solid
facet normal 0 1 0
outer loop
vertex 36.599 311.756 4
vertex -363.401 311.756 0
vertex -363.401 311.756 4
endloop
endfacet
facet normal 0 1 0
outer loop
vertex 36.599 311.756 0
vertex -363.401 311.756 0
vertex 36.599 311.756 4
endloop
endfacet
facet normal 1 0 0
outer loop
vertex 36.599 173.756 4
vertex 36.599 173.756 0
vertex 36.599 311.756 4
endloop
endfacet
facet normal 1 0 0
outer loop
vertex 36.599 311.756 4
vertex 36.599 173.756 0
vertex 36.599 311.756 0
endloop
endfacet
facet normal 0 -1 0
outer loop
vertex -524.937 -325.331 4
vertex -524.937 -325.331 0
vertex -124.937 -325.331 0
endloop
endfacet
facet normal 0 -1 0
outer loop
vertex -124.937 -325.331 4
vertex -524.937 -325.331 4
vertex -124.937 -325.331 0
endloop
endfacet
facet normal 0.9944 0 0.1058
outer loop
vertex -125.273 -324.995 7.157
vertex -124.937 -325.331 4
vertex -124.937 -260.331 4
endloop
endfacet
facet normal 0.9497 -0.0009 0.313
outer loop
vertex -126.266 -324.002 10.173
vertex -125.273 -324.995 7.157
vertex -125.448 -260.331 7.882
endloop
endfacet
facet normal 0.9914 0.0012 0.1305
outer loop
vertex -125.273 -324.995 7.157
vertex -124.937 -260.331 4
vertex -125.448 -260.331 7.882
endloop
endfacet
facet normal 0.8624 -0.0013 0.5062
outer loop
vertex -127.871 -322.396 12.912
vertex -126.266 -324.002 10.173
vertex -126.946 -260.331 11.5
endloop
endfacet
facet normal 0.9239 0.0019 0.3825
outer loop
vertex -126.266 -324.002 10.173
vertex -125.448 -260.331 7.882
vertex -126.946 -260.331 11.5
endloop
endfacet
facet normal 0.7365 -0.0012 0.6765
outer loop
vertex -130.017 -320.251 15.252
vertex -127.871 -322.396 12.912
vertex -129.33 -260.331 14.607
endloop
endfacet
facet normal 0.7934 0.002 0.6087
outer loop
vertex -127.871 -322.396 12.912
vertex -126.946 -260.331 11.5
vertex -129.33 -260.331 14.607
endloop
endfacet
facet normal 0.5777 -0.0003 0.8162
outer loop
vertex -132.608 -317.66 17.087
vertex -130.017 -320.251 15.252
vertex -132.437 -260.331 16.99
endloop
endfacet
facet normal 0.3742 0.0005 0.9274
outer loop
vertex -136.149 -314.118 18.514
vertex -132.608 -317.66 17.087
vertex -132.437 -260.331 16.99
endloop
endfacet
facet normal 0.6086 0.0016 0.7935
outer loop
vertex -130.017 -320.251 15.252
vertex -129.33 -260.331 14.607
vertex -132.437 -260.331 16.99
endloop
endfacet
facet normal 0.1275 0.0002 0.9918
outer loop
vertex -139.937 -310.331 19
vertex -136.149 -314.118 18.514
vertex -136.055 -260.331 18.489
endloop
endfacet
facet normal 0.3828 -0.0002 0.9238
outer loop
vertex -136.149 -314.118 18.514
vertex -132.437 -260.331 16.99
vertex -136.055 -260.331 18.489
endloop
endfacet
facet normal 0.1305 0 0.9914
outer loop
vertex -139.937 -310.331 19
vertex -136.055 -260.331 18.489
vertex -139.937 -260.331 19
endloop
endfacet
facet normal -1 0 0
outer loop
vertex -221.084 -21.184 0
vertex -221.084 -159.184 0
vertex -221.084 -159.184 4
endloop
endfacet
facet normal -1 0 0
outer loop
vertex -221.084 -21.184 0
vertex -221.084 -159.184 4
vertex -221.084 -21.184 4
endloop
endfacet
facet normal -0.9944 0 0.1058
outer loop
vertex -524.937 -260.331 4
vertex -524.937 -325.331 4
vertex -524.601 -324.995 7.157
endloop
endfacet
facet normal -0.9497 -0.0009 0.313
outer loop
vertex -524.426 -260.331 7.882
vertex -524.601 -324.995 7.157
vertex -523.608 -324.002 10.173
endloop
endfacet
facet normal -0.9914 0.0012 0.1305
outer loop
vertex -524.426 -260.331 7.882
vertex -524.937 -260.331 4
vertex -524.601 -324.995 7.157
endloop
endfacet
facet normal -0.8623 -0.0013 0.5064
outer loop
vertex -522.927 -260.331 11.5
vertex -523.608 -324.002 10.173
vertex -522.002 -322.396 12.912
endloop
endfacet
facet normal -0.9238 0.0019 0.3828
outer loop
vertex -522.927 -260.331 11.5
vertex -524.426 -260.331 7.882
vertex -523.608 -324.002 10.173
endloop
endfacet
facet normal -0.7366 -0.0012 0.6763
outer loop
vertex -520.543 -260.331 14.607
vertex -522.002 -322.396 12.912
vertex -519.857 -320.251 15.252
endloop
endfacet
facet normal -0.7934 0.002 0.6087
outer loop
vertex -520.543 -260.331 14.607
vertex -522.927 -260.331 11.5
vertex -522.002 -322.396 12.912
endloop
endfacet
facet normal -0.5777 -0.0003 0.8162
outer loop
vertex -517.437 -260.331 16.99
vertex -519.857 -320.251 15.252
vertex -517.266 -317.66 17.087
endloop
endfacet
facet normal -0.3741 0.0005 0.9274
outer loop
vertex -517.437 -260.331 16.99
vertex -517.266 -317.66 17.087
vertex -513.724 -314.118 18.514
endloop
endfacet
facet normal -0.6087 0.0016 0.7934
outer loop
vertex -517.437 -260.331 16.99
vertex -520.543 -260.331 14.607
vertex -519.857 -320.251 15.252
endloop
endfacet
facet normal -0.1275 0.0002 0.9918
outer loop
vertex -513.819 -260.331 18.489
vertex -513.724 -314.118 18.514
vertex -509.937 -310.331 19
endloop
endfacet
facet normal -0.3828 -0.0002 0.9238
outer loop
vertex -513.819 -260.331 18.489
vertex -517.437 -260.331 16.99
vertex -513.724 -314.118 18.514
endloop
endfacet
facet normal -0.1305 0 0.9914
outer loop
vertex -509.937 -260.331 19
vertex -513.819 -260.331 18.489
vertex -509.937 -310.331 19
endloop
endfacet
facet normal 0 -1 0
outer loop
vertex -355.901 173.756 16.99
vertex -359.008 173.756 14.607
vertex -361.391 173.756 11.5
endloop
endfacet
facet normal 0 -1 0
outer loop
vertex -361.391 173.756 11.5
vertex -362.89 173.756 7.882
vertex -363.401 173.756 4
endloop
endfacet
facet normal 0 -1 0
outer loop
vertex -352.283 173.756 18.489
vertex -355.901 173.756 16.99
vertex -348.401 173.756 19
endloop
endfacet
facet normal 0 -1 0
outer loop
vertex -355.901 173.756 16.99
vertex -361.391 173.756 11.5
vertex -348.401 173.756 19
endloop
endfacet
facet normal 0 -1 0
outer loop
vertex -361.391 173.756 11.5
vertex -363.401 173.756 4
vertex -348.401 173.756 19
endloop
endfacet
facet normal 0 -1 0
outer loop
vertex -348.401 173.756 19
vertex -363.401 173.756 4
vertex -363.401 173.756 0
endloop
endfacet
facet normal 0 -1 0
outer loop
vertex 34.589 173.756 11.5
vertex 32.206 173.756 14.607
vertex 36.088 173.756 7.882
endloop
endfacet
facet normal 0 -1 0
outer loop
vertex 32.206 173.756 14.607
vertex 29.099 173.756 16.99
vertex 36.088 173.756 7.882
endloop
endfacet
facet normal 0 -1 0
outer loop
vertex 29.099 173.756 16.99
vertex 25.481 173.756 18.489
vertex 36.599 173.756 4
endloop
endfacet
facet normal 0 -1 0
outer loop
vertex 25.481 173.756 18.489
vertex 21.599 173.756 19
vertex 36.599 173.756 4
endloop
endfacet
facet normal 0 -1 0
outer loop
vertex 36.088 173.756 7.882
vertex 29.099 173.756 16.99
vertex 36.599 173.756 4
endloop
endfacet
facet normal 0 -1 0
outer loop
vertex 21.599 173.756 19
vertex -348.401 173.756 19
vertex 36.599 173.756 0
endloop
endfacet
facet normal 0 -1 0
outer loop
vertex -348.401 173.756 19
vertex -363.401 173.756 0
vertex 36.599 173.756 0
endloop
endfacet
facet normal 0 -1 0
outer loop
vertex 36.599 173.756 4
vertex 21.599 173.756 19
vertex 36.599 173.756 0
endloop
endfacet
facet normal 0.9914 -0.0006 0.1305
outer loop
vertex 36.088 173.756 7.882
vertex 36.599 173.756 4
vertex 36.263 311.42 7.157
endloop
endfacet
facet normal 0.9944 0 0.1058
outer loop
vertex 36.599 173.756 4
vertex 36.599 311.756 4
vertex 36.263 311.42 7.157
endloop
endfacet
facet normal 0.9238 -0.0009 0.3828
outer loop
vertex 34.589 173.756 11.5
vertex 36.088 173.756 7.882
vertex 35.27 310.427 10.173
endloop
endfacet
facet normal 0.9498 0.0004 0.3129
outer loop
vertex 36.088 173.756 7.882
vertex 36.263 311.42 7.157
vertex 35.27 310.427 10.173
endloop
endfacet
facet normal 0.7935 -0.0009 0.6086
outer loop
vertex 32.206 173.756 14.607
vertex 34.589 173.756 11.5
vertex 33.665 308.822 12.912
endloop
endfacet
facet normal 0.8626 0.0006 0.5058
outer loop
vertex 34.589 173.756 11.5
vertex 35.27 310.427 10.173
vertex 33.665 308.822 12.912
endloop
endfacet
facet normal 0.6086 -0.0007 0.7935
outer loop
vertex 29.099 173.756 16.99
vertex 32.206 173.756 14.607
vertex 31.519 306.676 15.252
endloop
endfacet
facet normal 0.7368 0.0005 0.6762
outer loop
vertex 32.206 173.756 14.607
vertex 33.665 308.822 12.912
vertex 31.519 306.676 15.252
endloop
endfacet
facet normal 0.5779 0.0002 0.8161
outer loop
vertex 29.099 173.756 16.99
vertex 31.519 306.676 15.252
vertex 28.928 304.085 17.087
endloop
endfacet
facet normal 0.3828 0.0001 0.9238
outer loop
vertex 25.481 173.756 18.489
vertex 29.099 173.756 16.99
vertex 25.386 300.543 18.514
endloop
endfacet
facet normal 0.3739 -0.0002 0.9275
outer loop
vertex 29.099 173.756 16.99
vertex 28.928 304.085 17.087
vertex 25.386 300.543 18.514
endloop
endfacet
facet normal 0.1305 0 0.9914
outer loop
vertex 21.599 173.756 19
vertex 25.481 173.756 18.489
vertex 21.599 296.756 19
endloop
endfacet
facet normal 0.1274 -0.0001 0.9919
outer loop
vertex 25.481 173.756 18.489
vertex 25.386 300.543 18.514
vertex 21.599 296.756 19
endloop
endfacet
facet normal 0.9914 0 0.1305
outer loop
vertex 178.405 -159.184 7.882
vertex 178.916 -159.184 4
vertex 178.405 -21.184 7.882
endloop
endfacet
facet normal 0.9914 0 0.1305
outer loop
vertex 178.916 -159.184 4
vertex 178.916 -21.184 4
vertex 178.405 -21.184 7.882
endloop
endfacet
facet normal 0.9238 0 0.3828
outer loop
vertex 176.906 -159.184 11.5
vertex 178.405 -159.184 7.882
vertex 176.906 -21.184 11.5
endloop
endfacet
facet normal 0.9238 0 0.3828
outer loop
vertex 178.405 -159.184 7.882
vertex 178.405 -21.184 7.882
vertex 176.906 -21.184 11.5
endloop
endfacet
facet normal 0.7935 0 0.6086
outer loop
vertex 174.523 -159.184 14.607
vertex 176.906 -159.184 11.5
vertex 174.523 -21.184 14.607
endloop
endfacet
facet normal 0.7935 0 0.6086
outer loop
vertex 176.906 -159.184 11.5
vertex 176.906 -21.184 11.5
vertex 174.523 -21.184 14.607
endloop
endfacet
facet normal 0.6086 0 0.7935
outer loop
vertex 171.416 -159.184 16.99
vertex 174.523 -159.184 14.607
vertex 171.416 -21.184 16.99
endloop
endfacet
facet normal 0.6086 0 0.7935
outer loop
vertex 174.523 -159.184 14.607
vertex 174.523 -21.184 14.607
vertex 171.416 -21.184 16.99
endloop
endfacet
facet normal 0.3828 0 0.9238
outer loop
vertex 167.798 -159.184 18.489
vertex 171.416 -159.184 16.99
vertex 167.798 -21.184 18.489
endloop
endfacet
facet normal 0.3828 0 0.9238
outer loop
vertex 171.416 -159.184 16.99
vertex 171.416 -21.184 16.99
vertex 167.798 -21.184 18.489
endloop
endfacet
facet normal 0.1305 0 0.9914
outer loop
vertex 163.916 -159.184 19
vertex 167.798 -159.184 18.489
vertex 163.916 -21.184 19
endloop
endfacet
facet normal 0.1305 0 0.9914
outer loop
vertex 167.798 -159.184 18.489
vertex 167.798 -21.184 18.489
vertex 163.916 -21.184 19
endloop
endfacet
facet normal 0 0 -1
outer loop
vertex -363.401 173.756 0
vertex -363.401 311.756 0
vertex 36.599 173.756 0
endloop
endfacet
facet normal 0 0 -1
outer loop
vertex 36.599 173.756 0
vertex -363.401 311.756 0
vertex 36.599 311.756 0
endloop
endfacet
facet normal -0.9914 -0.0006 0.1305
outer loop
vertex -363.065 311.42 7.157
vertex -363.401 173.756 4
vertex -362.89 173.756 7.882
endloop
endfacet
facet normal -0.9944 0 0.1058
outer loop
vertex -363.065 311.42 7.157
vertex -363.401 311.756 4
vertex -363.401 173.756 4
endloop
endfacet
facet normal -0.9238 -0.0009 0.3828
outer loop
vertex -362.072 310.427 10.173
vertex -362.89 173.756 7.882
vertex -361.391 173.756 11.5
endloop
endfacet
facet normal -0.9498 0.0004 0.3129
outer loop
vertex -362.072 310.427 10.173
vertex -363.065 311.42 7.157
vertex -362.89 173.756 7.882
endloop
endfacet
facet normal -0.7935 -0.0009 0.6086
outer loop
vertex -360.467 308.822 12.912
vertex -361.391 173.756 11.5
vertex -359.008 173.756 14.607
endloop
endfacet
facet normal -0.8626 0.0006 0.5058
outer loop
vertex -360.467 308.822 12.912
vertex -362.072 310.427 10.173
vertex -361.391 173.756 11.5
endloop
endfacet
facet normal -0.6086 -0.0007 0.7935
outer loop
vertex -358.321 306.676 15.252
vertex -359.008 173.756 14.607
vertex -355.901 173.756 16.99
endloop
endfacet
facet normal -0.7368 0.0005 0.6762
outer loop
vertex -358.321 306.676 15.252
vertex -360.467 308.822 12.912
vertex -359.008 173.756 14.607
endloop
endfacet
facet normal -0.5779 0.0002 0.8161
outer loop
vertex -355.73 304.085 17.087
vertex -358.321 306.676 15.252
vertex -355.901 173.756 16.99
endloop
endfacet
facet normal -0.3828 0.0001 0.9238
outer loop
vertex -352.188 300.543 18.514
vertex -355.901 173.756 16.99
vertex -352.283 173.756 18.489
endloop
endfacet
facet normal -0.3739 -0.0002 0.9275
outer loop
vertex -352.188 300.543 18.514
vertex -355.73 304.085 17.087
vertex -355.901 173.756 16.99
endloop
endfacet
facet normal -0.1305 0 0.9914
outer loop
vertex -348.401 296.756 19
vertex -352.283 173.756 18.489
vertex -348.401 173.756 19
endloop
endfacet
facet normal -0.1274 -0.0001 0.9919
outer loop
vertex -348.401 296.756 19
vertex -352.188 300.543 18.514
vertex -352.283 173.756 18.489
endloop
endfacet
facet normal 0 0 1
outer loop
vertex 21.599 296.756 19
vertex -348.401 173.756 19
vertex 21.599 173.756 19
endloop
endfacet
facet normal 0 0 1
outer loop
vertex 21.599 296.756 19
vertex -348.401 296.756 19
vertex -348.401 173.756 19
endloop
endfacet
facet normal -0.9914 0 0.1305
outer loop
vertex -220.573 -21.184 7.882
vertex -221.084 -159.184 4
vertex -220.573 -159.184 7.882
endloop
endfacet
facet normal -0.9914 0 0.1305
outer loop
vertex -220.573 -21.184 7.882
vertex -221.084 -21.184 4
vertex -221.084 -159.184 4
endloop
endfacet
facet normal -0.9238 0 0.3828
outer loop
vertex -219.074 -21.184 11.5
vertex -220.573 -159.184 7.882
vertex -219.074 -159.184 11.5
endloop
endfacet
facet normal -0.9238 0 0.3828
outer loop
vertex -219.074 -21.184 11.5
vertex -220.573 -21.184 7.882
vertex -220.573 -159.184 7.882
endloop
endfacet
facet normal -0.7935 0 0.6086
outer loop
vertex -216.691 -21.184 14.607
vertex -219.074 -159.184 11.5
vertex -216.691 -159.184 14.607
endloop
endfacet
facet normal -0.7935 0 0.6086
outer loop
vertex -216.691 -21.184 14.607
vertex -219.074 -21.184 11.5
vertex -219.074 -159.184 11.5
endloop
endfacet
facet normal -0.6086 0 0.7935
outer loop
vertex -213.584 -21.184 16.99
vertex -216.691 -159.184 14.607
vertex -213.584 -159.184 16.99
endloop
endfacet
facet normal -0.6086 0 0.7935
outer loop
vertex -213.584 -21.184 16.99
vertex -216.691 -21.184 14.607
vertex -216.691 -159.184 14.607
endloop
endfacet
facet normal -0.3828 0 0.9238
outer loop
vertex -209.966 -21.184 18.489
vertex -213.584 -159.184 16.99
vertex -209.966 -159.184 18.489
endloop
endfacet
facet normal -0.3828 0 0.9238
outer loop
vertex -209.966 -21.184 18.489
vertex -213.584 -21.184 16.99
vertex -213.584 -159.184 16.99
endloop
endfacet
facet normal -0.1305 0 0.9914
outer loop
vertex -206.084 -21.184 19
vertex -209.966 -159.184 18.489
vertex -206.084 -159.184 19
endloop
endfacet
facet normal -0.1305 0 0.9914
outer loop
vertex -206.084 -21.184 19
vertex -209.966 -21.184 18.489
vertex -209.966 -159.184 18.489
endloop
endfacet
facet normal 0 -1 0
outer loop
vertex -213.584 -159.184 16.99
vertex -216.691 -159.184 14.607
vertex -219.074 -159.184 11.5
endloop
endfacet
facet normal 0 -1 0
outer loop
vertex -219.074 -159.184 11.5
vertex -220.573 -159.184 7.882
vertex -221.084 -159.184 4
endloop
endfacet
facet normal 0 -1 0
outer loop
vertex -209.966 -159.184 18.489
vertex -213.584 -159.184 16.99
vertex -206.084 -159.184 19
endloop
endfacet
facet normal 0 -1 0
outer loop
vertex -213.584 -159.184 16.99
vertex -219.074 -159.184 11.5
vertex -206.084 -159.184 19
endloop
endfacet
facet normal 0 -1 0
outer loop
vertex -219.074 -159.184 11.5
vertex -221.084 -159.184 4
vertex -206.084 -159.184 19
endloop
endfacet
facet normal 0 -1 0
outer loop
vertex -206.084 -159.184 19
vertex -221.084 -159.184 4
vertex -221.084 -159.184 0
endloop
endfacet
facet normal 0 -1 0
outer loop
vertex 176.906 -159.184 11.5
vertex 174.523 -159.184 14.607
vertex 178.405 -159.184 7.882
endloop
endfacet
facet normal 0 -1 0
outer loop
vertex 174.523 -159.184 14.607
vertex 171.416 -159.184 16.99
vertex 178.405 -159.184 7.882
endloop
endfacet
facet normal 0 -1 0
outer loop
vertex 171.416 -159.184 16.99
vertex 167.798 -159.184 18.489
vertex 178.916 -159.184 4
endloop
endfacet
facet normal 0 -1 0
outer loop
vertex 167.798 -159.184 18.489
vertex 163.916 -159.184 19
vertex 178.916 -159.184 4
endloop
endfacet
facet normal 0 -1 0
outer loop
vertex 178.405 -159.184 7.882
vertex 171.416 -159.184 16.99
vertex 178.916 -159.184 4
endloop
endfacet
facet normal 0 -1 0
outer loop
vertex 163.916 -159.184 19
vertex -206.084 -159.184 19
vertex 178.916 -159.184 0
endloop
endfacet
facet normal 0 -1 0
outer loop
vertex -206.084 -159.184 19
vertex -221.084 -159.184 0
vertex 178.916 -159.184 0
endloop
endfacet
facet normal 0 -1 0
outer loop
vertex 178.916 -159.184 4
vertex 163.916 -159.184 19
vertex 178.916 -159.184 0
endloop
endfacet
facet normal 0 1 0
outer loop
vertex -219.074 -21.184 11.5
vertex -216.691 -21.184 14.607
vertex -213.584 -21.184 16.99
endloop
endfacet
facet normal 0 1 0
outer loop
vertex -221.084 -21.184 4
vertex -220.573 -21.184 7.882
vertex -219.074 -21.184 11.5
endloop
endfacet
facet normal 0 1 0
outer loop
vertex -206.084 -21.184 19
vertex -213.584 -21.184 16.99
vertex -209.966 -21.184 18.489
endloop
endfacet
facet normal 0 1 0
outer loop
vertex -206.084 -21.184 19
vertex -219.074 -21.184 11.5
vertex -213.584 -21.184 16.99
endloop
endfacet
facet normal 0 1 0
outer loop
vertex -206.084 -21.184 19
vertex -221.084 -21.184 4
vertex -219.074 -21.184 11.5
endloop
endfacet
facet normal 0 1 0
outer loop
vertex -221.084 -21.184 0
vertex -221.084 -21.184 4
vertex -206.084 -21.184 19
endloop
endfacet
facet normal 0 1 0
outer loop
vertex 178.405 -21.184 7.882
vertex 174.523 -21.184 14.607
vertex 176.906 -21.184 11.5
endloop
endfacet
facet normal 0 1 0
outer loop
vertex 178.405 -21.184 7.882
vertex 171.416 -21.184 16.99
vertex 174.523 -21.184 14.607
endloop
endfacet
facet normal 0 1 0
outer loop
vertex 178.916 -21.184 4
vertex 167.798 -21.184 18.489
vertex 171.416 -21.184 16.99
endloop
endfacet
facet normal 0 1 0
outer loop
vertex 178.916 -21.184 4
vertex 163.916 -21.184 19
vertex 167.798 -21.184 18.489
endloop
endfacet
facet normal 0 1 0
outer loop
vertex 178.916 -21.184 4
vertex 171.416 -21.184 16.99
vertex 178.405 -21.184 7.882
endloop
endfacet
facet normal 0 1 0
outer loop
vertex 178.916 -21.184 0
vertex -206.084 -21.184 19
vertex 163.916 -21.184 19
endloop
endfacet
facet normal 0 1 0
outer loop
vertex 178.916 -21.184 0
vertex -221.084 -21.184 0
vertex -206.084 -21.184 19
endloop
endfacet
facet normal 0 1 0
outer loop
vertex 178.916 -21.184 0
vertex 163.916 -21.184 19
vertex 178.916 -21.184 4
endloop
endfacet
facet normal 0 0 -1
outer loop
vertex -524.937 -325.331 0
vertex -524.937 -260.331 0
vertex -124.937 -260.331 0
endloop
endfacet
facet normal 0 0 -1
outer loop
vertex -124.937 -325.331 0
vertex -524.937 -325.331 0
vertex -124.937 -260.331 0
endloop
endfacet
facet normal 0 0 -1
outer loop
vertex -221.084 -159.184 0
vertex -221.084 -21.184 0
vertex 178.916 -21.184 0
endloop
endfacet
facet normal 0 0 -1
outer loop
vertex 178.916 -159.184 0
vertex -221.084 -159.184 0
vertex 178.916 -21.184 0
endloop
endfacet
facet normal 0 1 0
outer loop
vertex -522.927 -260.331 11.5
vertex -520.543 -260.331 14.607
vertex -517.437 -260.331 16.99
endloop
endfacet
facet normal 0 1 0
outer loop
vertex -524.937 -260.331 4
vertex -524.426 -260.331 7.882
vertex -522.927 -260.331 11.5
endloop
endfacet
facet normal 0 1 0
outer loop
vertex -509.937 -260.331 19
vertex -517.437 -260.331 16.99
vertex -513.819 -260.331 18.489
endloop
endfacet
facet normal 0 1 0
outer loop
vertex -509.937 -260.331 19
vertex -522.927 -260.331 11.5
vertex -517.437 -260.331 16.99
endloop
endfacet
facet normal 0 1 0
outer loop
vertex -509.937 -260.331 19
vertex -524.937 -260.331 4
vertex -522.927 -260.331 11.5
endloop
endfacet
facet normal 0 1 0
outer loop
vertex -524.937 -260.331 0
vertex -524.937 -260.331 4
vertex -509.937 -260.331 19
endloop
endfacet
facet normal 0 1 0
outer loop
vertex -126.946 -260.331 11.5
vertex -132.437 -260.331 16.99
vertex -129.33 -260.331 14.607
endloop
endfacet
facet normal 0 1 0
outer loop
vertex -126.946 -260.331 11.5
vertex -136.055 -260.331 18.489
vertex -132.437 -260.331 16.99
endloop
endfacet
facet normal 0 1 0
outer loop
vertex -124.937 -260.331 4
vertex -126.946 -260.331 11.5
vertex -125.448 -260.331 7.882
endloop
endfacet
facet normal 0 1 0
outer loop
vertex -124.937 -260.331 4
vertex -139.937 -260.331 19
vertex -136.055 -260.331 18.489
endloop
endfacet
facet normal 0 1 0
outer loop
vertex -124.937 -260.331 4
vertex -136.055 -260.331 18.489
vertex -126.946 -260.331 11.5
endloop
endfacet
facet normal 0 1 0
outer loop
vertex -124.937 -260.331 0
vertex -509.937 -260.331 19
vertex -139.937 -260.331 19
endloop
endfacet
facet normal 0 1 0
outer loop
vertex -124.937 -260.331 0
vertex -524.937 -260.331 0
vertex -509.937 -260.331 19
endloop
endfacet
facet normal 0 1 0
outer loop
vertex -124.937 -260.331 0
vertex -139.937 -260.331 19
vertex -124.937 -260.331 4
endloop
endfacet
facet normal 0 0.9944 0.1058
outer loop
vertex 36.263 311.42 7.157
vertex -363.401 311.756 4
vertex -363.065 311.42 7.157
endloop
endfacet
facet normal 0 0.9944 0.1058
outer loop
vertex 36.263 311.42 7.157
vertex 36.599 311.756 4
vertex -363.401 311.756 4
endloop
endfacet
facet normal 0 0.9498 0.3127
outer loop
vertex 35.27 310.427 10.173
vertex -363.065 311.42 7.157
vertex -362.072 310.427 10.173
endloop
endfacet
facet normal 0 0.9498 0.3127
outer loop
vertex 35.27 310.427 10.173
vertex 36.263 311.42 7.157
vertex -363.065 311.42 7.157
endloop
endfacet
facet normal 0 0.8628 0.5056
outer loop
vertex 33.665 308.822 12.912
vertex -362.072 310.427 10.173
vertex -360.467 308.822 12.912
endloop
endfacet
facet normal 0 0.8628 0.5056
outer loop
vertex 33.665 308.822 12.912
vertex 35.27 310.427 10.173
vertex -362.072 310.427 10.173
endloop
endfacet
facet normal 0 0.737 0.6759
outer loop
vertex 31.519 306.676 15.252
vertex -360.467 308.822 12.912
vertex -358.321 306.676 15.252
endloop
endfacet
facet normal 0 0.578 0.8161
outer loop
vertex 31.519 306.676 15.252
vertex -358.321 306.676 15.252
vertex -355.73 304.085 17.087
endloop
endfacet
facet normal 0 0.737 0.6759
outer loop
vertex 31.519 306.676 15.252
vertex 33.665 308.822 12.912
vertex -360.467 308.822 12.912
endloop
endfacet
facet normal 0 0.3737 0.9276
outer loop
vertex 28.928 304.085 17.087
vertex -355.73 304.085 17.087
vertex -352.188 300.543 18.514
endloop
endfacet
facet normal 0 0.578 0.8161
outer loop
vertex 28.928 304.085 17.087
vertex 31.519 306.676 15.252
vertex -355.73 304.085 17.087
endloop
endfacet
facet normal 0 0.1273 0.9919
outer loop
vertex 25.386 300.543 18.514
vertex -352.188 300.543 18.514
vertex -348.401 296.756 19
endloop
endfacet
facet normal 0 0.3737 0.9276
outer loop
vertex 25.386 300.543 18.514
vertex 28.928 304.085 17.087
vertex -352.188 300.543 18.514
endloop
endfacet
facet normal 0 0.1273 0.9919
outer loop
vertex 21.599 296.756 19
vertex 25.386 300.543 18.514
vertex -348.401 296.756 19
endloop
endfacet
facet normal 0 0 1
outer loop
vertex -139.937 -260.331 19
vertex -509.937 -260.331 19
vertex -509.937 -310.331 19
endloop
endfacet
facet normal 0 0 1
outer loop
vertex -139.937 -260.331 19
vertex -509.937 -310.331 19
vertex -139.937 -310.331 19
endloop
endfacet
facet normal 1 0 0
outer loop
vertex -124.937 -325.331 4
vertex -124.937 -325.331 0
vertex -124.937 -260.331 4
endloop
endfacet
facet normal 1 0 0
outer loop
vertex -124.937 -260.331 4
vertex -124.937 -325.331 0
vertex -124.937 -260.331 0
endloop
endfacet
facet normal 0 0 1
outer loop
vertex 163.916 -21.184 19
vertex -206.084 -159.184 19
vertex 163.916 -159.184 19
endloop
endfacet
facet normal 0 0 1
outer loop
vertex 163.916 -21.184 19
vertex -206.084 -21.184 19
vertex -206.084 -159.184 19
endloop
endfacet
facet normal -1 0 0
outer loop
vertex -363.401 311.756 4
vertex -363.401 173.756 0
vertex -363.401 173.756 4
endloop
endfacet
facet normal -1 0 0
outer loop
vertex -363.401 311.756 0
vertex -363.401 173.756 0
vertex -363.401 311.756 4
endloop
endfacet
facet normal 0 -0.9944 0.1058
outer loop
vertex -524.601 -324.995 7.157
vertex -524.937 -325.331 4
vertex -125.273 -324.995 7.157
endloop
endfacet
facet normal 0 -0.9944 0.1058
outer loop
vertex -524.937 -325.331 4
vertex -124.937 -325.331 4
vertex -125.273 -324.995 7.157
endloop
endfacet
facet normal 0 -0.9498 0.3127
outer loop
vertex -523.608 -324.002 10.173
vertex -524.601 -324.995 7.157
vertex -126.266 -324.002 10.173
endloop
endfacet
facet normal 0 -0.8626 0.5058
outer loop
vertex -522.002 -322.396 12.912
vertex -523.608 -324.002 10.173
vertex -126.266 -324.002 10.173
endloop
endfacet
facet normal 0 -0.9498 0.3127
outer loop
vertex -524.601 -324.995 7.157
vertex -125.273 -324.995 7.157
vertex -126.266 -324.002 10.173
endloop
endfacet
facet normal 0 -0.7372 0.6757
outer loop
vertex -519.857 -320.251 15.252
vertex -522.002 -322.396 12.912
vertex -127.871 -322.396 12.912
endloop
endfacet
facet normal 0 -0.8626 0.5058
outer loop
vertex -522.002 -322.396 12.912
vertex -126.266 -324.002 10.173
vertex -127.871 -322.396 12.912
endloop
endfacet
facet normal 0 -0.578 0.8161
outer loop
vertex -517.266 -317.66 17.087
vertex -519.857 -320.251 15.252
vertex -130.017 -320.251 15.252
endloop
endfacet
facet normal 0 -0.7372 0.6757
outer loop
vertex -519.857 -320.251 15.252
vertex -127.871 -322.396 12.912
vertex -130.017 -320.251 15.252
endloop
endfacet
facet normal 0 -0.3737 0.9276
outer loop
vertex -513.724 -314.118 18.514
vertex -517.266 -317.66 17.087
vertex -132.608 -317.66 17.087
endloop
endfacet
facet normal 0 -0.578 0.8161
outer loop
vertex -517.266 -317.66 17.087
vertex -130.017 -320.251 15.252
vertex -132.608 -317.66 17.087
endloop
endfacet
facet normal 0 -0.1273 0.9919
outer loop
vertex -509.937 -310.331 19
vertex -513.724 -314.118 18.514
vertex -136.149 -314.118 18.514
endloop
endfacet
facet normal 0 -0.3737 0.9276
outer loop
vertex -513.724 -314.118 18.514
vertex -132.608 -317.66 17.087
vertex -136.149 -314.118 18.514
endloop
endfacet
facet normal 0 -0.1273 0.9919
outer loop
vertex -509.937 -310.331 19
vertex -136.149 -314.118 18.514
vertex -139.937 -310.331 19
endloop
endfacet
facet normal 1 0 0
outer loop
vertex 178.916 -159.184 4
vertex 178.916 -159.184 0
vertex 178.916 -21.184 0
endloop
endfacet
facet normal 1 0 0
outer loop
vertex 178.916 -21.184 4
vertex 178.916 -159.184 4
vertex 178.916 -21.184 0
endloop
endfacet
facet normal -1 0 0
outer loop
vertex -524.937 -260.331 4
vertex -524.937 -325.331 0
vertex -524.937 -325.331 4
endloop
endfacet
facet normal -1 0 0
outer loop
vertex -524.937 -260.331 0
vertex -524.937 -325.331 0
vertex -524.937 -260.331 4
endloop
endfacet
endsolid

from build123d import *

# Parameters (mm, degrees)
F0_W     = 400
F0_H     = 138
F0_H_2   = 65
F1_DEPTH = 19
F2_R     = 15


with BuildPart() as f1:
    # F0 (on Top) → F1 (new body)
    with BuildSketch(Plane.XY):
        with Locations((-21.084036, -90.183537)):
            Rectangle(F0_W, F0_H)
        with Locations((-163.400936, 242.755899)):
            Rectangle(F0_W, F0_H)
        with Locations((-324.936855, -292.830824)):
            Rectangle(F0_W, F0_H_2)
    extrude(amount=F1_DEPTH)

    # F2
    f2_edges = [f1.edges().sort_by_distance(p)[0] for p in [
        (-324.936855, -325.330824, 19),
        (-124.936855, -292.830824, 19),
        (-524.936855, -292.830824, 19),
        (-221.084036, -90.183537, 19),
        (178.915964, -90.183537, 19),
        (36.599064, 242.755899, 19),
        (-163.400936, 311.755899, 19),
        (-363.400936, 242.755899, 19),
    ]]
    fillet(f2_edges, radius=F2_R)


solid = f1.part
